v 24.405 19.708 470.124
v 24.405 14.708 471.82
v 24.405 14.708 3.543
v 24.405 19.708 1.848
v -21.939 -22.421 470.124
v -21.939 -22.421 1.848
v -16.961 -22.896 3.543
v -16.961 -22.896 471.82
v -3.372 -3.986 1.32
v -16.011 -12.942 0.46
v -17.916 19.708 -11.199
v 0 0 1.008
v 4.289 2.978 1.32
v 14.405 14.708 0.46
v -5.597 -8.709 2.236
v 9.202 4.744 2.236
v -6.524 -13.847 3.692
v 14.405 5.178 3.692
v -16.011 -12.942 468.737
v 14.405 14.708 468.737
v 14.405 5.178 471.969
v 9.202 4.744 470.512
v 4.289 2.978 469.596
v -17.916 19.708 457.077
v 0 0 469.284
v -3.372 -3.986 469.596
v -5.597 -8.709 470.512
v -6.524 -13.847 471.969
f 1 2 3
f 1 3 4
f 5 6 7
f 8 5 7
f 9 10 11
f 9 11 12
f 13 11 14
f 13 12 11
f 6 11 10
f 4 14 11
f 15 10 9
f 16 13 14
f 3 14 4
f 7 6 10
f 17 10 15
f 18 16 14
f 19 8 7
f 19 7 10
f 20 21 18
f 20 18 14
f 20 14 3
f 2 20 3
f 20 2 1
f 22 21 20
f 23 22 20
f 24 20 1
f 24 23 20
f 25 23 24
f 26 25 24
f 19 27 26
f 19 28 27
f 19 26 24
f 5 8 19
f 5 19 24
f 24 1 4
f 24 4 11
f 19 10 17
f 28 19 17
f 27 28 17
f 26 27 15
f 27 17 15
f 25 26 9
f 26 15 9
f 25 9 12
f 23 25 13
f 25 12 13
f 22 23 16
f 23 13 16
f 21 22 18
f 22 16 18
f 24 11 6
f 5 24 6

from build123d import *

# Parameters (mm, degrees)
BOSS_EXTRUDE2_DEPTH      = 514
BOSS_EXTRUDE2_DEPTH_BACK = 40
CUT_EXTRUDE1_DEPTH       = 3636.875029428
CUT_EXTRUDE1_DEPTH_BACK  = 3636.875029428


with BuildPart() as part:
    # Sketch1 → Boss-Extrude2 (new, two sides: drawn at the far end of the back side and taken through both)
    with BuildSketch(Plane.XY.offset(-BOSS_EXTRUDE2_DEPTH_BACK)):
        with BuildLine():
            Line((14.404810003, 5.178419046), (14.404810003, 14.708419046))
            Line((14.404810003, 14.708419046), (24.404810003, 14.708419046))
            Line((24.404810003, 14.708419046), (24.404810003, 19.708419046))
            Line((24.404810003, 19.708419046), (-17.916389143, 19.708419046))
            Line((-17.916389143, 19.708419046), (-21.938692577, -22.421202033))
            Line((-21.938692577, -22.421202033), (-16.961326395, -22.896413454))
            Line((-16.961326395, -22.896413454), (-16.010903554, -12.941681091))
            Line((-16.010903554, -12.941681091), (-6.524043612, -13.847434058))
            ThreePointArc((-6.524043612, -13.847434058), (0, 0), (14.404810003, 5.178419046))
        make_face()
    extrude(amount=BOSS_EXTRUDE2_DEPTH + BOSS_EXTRUDE2_DEPTH_BACK)

    # Sketch2 → Cut-Extrude1 (cut, two sides: drawn at the far end of the back side and taken through both)
    with BuildSketch(Plane(origin=(-738.20187256, 812.038169561, 3415.561100518), x_dir=(-0.955618514406147, 0, -0.2946069498911878), z_dir=(0.0908241663548398, 0.9512926552232807, -0.29460694989118763)).offset(-CUT_EXTRUDE1_DEPTH_BACK)):
        Polygon((69.88483537, -3135.609871351), (246.824126872, -3135.609871351), (167.605357186, -3034.434147623), align=None)
        Polygon((236.262195777, -3561.307235785), (313.780261045, -3654.403893751), (393.908665817, -3561.307235785), align=None)
    extrude(amount=CUT_EXTRUDE1_DEPTH + CUT_EXTRUDE1_DEPTH_BACK, mode=Mode.SUBTRACT)


solid = part.part
